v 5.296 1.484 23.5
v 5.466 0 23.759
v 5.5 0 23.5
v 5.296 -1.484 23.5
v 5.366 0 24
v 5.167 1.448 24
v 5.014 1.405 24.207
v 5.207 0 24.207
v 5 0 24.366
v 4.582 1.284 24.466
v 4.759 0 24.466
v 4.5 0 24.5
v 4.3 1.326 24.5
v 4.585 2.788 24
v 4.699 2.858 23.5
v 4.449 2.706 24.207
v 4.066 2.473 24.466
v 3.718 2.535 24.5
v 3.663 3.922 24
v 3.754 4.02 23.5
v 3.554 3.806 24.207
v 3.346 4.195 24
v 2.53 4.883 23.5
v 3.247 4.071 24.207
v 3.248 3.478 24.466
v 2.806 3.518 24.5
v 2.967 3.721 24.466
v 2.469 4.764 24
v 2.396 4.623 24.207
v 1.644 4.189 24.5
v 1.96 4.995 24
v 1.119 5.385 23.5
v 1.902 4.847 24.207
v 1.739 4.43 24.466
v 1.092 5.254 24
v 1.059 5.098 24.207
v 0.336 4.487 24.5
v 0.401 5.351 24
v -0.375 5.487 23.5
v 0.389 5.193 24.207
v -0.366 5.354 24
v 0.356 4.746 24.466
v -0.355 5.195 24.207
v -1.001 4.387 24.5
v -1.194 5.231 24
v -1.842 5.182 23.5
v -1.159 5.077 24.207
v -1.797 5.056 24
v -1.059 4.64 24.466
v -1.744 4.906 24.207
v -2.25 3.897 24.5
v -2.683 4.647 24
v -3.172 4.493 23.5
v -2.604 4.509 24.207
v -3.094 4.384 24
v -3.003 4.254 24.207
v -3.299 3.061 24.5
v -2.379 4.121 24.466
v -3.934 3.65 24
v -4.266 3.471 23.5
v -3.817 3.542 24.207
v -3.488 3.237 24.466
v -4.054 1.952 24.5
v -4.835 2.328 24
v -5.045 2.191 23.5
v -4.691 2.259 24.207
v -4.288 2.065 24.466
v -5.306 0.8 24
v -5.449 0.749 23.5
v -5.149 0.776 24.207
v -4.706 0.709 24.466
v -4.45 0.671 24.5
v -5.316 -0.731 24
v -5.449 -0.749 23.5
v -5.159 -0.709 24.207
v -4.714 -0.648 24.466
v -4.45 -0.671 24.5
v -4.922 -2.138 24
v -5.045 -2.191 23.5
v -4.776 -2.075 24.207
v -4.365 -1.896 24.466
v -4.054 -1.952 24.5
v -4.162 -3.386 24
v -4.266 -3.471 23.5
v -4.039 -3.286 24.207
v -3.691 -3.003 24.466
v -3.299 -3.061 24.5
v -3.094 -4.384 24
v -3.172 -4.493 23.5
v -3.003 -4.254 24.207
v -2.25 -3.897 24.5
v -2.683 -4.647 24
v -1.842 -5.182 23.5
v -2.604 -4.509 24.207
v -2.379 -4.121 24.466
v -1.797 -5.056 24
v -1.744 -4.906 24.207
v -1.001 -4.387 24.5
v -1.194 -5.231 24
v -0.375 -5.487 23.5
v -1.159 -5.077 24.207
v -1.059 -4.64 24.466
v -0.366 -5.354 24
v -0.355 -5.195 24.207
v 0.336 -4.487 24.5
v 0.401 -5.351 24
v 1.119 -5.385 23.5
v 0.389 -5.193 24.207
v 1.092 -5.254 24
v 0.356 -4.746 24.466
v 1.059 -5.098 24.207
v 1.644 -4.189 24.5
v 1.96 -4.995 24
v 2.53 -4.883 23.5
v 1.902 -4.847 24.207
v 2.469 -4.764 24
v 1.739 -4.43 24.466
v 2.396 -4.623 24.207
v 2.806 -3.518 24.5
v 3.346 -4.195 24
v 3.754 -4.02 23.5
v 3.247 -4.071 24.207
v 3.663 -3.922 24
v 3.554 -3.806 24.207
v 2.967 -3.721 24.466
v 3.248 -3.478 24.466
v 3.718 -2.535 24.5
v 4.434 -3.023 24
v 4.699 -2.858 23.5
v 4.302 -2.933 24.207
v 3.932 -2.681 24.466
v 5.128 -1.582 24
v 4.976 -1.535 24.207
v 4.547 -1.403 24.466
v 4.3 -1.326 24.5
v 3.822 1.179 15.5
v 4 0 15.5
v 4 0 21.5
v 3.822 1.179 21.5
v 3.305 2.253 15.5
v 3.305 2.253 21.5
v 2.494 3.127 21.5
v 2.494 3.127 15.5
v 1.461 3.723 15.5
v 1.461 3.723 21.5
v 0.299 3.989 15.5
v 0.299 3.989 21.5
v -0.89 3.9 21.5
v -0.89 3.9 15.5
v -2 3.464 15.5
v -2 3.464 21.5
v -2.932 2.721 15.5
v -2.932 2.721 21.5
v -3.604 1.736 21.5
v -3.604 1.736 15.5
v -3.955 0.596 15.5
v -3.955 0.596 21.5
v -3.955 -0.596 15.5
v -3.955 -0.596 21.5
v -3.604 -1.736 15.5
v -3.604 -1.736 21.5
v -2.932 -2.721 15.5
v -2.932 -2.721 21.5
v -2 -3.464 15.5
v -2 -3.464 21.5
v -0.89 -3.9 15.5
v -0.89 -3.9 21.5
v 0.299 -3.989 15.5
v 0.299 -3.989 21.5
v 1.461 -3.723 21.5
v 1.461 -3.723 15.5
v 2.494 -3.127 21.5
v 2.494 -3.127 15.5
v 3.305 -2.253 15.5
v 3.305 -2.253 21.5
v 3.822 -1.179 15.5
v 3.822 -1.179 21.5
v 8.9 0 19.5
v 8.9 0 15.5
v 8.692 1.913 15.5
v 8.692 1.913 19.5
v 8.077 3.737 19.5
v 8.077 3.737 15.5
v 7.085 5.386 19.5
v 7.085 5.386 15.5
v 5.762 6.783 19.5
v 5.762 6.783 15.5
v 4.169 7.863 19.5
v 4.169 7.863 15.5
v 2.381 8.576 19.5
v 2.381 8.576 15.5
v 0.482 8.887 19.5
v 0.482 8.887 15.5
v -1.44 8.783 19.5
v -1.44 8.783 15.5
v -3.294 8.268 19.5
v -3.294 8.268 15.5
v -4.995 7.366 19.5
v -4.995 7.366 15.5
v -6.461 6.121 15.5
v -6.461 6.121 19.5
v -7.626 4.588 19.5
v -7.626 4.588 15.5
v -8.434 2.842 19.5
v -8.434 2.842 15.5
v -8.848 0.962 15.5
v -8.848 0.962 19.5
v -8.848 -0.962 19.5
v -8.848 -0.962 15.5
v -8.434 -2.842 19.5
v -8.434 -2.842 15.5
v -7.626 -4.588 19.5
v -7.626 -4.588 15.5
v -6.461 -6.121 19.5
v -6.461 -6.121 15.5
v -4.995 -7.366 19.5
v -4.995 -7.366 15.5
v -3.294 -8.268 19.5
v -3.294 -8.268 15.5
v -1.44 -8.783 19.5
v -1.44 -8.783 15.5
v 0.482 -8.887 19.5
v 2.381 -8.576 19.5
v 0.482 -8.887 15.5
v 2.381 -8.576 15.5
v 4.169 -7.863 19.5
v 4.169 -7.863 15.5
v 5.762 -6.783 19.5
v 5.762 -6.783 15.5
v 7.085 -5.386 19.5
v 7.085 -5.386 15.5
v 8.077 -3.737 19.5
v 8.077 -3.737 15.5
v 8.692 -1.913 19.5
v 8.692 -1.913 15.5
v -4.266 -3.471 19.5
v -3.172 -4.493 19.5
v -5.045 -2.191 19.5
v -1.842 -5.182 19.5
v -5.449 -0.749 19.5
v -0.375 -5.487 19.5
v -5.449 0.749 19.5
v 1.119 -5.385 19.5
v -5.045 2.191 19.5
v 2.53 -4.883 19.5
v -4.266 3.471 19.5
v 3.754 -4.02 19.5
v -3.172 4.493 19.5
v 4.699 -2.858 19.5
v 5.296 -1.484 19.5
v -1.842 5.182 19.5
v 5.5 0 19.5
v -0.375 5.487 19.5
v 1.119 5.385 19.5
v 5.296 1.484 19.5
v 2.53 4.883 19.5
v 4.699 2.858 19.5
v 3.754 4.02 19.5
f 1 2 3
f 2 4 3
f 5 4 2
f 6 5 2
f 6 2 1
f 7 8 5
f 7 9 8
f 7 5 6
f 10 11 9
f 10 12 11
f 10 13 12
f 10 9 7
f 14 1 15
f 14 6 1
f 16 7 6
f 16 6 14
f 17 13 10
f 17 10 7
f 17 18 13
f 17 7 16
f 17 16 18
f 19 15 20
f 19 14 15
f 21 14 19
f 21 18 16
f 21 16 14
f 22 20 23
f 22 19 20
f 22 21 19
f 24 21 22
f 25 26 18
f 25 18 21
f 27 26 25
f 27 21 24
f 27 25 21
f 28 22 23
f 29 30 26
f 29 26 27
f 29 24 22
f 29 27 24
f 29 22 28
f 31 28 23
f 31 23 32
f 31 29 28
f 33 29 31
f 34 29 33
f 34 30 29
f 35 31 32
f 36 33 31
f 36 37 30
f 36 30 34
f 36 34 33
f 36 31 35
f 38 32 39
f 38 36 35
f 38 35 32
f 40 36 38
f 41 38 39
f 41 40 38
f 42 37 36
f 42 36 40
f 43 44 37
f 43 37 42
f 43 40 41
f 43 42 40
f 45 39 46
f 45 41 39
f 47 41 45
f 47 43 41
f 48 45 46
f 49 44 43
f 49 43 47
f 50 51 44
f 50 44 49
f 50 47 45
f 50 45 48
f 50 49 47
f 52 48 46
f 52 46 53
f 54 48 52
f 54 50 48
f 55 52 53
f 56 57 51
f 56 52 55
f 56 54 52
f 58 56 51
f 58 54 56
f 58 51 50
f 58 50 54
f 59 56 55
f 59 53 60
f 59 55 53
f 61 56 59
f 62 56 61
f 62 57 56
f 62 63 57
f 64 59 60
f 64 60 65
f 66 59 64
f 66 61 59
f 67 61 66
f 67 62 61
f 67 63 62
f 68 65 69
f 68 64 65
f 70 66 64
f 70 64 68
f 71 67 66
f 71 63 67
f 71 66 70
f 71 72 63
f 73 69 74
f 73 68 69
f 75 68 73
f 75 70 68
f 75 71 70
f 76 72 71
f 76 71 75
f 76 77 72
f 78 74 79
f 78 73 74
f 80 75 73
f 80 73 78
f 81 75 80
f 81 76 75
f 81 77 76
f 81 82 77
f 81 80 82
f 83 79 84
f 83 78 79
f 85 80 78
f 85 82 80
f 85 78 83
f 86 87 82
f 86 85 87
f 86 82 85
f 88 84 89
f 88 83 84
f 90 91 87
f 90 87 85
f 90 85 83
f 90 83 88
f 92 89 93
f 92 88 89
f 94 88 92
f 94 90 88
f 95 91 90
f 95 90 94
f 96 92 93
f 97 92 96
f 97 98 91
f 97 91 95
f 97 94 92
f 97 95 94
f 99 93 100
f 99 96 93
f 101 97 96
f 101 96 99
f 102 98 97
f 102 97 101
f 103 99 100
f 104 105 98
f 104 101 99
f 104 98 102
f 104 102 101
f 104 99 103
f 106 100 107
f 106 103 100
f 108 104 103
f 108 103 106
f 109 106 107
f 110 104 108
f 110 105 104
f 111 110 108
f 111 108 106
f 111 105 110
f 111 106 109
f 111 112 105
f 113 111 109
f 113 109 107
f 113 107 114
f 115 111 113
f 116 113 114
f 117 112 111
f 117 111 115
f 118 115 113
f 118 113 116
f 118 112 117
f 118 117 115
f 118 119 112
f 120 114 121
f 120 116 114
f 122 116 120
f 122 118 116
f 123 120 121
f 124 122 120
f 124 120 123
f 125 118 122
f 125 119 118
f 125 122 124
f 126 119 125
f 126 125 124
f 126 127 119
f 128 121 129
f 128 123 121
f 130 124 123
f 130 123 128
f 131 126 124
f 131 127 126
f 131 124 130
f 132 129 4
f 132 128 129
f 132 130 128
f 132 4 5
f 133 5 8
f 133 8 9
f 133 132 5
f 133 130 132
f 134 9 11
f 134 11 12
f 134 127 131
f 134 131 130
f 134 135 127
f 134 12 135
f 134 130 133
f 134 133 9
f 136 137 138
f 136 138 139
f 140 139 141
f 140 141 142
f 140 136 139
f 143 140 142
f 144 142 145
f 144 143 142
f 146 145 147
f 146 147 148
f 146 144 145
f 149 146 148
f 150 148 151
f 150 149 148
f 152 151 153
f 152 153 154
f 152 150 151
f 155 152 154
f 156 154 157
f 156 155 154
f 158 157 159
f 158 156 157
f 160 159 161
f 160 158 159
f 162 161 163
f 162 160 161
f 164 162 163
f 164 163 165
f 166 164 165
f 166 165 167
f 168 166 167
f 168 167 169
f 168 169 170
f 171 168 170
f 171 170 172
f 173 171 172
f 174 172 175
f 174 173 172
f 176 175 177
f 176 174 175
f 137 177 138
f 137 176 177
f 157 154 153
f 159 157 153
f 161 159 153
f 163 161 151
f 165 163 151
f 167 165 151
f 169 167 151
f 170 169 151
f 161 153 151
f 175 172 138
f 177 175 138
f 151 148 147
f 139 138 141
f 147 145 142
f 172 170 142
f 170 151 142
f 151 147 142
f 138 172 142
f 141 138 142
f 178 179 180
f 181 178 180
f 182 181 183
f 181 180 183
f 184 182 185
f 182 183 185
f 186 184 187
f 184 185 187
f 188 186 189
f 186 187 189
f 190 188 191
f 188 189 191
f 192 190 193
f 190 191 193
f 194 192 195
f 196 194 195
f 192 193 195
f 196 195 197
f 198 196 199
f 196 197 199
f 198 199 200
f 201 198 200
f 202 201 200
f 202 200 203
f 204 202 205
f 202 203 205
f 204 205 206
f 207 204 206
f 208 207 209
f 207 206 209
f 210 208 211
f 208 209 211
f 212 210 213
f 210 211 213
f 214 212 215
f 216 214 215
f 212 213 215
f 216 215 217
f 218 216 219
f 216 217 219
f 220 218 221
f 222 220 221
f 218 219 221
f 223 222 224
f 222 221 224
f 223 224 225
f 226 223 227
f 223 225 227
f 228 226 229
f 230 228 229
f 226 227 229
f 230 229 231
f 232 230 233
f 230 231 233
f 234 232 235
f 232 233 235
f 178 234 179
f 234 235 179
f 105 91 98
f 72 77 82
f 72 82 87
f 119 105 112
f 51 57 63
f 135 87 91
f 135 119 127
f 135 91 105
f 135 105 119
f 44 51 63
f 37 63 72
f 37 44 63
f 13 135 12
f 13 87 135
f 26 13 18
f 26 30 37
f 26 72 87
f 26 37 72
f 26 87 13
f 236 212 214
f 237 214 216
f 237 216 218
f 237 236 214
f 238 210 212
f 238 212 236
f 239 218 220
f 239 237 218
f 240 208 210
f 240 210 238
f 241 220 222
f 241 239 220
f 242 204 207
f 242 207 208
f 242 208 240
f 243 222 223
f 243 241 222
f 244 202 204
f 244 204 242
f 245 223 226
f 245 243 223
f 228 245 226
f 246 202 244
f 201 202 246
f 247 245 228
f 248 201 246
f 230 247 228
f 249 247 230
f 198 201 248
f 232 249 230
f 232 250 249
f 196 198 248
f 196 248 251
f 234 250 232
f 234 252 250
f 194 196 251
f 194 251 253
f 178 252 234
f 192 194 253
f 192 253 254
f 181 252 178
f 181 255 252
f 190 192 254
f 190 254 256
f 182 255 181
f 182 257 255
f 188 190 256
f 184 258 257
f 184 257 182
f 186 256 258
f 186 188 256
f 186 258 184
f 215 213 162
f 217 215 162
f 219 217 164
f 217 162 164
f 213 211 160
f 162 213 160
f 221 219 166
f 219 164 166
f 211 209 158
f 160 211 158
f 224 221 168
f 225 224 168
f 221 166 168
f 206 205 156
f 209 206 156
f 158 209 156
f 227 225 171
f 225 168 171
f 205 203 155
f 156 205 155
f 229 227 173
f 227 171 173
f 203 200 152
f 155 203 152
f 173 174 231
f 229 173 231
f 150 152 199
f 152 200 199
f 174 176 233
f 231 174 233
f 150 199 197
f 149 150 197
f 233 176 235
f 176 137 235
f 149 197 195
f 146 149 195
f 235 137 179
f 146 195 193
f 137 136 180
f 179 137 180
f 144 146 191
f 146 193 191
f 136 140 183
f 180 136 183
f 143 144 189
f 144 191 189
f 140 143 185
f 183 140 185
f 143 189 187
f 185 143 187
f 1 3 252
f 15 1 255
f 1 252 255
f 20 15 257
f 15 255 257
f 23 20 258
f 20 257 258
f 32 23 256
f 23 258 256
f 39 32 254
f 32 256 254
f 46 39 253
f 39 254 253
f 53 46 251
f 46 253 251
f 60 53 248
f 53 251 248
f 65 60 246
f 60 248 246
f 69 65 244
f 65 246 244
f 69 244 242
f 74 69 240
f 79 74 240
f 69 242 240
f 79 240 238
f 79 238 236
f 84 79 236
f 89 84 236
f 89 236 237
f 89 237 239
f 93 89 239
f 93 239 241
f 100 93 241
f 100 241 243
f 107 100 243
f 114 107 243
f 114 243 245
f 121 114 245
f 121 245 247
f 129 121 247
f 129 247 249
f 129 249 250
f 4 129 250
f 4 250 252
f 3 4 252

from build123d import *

# Parameters (mm, degrees)
CYLINDER063_R     = 4
CYLINDER063_DEPTH = 6
CYLINDER064_R     = 5.5
CYLINDER064_DEPTH = 9
FILLET005_R       = 1
CYLINDER065_R     = 8.9
CYLINDER065_DEPTH = 4


with BuildPart() as cylinder063:
    # Cylinder063 → Cylinder063 (new body)
    with BuildSketch(Plane.XY.offset(15.5)):
        Circle(CYLINDER063_R)
    extrude(amount=CYLINDER063_DEPTH)


with BuildPart() as fillet005:
    # Cylinder064 → Cylinder064 (new body)
    with BuildSketch(Plane.XY.offset(15.5)):
        Circle(CYLINDER064_R)
    extrude(amount=CYLINDER064_DEPTH)

    # Fillet005
    fillet005_edges = [fillet005.edges().sort_by_distance(p)[0] for p in [
        (-5.5, 0, 24.5),
    ]]
    fillet(fillet005_edges, radius=FILLET005_R)


with BuildPart() as hub_cap_middle:
    # Cylinder065 → Cylinder065 (new body)
    with BuildSketch(Plane.XY.offset(15.5)):
        Circle(CYLINDER065_R)
    extrude(amount=CYLINDER065_DEPTH)

    # Fusion031: union Fillet005
    add(fillet005.part)

    # Cut015: cut Cylinder063
    add(cylinder063.part, mode=Mode.SUBTRACT)


solid = hub_cap_middle.part
